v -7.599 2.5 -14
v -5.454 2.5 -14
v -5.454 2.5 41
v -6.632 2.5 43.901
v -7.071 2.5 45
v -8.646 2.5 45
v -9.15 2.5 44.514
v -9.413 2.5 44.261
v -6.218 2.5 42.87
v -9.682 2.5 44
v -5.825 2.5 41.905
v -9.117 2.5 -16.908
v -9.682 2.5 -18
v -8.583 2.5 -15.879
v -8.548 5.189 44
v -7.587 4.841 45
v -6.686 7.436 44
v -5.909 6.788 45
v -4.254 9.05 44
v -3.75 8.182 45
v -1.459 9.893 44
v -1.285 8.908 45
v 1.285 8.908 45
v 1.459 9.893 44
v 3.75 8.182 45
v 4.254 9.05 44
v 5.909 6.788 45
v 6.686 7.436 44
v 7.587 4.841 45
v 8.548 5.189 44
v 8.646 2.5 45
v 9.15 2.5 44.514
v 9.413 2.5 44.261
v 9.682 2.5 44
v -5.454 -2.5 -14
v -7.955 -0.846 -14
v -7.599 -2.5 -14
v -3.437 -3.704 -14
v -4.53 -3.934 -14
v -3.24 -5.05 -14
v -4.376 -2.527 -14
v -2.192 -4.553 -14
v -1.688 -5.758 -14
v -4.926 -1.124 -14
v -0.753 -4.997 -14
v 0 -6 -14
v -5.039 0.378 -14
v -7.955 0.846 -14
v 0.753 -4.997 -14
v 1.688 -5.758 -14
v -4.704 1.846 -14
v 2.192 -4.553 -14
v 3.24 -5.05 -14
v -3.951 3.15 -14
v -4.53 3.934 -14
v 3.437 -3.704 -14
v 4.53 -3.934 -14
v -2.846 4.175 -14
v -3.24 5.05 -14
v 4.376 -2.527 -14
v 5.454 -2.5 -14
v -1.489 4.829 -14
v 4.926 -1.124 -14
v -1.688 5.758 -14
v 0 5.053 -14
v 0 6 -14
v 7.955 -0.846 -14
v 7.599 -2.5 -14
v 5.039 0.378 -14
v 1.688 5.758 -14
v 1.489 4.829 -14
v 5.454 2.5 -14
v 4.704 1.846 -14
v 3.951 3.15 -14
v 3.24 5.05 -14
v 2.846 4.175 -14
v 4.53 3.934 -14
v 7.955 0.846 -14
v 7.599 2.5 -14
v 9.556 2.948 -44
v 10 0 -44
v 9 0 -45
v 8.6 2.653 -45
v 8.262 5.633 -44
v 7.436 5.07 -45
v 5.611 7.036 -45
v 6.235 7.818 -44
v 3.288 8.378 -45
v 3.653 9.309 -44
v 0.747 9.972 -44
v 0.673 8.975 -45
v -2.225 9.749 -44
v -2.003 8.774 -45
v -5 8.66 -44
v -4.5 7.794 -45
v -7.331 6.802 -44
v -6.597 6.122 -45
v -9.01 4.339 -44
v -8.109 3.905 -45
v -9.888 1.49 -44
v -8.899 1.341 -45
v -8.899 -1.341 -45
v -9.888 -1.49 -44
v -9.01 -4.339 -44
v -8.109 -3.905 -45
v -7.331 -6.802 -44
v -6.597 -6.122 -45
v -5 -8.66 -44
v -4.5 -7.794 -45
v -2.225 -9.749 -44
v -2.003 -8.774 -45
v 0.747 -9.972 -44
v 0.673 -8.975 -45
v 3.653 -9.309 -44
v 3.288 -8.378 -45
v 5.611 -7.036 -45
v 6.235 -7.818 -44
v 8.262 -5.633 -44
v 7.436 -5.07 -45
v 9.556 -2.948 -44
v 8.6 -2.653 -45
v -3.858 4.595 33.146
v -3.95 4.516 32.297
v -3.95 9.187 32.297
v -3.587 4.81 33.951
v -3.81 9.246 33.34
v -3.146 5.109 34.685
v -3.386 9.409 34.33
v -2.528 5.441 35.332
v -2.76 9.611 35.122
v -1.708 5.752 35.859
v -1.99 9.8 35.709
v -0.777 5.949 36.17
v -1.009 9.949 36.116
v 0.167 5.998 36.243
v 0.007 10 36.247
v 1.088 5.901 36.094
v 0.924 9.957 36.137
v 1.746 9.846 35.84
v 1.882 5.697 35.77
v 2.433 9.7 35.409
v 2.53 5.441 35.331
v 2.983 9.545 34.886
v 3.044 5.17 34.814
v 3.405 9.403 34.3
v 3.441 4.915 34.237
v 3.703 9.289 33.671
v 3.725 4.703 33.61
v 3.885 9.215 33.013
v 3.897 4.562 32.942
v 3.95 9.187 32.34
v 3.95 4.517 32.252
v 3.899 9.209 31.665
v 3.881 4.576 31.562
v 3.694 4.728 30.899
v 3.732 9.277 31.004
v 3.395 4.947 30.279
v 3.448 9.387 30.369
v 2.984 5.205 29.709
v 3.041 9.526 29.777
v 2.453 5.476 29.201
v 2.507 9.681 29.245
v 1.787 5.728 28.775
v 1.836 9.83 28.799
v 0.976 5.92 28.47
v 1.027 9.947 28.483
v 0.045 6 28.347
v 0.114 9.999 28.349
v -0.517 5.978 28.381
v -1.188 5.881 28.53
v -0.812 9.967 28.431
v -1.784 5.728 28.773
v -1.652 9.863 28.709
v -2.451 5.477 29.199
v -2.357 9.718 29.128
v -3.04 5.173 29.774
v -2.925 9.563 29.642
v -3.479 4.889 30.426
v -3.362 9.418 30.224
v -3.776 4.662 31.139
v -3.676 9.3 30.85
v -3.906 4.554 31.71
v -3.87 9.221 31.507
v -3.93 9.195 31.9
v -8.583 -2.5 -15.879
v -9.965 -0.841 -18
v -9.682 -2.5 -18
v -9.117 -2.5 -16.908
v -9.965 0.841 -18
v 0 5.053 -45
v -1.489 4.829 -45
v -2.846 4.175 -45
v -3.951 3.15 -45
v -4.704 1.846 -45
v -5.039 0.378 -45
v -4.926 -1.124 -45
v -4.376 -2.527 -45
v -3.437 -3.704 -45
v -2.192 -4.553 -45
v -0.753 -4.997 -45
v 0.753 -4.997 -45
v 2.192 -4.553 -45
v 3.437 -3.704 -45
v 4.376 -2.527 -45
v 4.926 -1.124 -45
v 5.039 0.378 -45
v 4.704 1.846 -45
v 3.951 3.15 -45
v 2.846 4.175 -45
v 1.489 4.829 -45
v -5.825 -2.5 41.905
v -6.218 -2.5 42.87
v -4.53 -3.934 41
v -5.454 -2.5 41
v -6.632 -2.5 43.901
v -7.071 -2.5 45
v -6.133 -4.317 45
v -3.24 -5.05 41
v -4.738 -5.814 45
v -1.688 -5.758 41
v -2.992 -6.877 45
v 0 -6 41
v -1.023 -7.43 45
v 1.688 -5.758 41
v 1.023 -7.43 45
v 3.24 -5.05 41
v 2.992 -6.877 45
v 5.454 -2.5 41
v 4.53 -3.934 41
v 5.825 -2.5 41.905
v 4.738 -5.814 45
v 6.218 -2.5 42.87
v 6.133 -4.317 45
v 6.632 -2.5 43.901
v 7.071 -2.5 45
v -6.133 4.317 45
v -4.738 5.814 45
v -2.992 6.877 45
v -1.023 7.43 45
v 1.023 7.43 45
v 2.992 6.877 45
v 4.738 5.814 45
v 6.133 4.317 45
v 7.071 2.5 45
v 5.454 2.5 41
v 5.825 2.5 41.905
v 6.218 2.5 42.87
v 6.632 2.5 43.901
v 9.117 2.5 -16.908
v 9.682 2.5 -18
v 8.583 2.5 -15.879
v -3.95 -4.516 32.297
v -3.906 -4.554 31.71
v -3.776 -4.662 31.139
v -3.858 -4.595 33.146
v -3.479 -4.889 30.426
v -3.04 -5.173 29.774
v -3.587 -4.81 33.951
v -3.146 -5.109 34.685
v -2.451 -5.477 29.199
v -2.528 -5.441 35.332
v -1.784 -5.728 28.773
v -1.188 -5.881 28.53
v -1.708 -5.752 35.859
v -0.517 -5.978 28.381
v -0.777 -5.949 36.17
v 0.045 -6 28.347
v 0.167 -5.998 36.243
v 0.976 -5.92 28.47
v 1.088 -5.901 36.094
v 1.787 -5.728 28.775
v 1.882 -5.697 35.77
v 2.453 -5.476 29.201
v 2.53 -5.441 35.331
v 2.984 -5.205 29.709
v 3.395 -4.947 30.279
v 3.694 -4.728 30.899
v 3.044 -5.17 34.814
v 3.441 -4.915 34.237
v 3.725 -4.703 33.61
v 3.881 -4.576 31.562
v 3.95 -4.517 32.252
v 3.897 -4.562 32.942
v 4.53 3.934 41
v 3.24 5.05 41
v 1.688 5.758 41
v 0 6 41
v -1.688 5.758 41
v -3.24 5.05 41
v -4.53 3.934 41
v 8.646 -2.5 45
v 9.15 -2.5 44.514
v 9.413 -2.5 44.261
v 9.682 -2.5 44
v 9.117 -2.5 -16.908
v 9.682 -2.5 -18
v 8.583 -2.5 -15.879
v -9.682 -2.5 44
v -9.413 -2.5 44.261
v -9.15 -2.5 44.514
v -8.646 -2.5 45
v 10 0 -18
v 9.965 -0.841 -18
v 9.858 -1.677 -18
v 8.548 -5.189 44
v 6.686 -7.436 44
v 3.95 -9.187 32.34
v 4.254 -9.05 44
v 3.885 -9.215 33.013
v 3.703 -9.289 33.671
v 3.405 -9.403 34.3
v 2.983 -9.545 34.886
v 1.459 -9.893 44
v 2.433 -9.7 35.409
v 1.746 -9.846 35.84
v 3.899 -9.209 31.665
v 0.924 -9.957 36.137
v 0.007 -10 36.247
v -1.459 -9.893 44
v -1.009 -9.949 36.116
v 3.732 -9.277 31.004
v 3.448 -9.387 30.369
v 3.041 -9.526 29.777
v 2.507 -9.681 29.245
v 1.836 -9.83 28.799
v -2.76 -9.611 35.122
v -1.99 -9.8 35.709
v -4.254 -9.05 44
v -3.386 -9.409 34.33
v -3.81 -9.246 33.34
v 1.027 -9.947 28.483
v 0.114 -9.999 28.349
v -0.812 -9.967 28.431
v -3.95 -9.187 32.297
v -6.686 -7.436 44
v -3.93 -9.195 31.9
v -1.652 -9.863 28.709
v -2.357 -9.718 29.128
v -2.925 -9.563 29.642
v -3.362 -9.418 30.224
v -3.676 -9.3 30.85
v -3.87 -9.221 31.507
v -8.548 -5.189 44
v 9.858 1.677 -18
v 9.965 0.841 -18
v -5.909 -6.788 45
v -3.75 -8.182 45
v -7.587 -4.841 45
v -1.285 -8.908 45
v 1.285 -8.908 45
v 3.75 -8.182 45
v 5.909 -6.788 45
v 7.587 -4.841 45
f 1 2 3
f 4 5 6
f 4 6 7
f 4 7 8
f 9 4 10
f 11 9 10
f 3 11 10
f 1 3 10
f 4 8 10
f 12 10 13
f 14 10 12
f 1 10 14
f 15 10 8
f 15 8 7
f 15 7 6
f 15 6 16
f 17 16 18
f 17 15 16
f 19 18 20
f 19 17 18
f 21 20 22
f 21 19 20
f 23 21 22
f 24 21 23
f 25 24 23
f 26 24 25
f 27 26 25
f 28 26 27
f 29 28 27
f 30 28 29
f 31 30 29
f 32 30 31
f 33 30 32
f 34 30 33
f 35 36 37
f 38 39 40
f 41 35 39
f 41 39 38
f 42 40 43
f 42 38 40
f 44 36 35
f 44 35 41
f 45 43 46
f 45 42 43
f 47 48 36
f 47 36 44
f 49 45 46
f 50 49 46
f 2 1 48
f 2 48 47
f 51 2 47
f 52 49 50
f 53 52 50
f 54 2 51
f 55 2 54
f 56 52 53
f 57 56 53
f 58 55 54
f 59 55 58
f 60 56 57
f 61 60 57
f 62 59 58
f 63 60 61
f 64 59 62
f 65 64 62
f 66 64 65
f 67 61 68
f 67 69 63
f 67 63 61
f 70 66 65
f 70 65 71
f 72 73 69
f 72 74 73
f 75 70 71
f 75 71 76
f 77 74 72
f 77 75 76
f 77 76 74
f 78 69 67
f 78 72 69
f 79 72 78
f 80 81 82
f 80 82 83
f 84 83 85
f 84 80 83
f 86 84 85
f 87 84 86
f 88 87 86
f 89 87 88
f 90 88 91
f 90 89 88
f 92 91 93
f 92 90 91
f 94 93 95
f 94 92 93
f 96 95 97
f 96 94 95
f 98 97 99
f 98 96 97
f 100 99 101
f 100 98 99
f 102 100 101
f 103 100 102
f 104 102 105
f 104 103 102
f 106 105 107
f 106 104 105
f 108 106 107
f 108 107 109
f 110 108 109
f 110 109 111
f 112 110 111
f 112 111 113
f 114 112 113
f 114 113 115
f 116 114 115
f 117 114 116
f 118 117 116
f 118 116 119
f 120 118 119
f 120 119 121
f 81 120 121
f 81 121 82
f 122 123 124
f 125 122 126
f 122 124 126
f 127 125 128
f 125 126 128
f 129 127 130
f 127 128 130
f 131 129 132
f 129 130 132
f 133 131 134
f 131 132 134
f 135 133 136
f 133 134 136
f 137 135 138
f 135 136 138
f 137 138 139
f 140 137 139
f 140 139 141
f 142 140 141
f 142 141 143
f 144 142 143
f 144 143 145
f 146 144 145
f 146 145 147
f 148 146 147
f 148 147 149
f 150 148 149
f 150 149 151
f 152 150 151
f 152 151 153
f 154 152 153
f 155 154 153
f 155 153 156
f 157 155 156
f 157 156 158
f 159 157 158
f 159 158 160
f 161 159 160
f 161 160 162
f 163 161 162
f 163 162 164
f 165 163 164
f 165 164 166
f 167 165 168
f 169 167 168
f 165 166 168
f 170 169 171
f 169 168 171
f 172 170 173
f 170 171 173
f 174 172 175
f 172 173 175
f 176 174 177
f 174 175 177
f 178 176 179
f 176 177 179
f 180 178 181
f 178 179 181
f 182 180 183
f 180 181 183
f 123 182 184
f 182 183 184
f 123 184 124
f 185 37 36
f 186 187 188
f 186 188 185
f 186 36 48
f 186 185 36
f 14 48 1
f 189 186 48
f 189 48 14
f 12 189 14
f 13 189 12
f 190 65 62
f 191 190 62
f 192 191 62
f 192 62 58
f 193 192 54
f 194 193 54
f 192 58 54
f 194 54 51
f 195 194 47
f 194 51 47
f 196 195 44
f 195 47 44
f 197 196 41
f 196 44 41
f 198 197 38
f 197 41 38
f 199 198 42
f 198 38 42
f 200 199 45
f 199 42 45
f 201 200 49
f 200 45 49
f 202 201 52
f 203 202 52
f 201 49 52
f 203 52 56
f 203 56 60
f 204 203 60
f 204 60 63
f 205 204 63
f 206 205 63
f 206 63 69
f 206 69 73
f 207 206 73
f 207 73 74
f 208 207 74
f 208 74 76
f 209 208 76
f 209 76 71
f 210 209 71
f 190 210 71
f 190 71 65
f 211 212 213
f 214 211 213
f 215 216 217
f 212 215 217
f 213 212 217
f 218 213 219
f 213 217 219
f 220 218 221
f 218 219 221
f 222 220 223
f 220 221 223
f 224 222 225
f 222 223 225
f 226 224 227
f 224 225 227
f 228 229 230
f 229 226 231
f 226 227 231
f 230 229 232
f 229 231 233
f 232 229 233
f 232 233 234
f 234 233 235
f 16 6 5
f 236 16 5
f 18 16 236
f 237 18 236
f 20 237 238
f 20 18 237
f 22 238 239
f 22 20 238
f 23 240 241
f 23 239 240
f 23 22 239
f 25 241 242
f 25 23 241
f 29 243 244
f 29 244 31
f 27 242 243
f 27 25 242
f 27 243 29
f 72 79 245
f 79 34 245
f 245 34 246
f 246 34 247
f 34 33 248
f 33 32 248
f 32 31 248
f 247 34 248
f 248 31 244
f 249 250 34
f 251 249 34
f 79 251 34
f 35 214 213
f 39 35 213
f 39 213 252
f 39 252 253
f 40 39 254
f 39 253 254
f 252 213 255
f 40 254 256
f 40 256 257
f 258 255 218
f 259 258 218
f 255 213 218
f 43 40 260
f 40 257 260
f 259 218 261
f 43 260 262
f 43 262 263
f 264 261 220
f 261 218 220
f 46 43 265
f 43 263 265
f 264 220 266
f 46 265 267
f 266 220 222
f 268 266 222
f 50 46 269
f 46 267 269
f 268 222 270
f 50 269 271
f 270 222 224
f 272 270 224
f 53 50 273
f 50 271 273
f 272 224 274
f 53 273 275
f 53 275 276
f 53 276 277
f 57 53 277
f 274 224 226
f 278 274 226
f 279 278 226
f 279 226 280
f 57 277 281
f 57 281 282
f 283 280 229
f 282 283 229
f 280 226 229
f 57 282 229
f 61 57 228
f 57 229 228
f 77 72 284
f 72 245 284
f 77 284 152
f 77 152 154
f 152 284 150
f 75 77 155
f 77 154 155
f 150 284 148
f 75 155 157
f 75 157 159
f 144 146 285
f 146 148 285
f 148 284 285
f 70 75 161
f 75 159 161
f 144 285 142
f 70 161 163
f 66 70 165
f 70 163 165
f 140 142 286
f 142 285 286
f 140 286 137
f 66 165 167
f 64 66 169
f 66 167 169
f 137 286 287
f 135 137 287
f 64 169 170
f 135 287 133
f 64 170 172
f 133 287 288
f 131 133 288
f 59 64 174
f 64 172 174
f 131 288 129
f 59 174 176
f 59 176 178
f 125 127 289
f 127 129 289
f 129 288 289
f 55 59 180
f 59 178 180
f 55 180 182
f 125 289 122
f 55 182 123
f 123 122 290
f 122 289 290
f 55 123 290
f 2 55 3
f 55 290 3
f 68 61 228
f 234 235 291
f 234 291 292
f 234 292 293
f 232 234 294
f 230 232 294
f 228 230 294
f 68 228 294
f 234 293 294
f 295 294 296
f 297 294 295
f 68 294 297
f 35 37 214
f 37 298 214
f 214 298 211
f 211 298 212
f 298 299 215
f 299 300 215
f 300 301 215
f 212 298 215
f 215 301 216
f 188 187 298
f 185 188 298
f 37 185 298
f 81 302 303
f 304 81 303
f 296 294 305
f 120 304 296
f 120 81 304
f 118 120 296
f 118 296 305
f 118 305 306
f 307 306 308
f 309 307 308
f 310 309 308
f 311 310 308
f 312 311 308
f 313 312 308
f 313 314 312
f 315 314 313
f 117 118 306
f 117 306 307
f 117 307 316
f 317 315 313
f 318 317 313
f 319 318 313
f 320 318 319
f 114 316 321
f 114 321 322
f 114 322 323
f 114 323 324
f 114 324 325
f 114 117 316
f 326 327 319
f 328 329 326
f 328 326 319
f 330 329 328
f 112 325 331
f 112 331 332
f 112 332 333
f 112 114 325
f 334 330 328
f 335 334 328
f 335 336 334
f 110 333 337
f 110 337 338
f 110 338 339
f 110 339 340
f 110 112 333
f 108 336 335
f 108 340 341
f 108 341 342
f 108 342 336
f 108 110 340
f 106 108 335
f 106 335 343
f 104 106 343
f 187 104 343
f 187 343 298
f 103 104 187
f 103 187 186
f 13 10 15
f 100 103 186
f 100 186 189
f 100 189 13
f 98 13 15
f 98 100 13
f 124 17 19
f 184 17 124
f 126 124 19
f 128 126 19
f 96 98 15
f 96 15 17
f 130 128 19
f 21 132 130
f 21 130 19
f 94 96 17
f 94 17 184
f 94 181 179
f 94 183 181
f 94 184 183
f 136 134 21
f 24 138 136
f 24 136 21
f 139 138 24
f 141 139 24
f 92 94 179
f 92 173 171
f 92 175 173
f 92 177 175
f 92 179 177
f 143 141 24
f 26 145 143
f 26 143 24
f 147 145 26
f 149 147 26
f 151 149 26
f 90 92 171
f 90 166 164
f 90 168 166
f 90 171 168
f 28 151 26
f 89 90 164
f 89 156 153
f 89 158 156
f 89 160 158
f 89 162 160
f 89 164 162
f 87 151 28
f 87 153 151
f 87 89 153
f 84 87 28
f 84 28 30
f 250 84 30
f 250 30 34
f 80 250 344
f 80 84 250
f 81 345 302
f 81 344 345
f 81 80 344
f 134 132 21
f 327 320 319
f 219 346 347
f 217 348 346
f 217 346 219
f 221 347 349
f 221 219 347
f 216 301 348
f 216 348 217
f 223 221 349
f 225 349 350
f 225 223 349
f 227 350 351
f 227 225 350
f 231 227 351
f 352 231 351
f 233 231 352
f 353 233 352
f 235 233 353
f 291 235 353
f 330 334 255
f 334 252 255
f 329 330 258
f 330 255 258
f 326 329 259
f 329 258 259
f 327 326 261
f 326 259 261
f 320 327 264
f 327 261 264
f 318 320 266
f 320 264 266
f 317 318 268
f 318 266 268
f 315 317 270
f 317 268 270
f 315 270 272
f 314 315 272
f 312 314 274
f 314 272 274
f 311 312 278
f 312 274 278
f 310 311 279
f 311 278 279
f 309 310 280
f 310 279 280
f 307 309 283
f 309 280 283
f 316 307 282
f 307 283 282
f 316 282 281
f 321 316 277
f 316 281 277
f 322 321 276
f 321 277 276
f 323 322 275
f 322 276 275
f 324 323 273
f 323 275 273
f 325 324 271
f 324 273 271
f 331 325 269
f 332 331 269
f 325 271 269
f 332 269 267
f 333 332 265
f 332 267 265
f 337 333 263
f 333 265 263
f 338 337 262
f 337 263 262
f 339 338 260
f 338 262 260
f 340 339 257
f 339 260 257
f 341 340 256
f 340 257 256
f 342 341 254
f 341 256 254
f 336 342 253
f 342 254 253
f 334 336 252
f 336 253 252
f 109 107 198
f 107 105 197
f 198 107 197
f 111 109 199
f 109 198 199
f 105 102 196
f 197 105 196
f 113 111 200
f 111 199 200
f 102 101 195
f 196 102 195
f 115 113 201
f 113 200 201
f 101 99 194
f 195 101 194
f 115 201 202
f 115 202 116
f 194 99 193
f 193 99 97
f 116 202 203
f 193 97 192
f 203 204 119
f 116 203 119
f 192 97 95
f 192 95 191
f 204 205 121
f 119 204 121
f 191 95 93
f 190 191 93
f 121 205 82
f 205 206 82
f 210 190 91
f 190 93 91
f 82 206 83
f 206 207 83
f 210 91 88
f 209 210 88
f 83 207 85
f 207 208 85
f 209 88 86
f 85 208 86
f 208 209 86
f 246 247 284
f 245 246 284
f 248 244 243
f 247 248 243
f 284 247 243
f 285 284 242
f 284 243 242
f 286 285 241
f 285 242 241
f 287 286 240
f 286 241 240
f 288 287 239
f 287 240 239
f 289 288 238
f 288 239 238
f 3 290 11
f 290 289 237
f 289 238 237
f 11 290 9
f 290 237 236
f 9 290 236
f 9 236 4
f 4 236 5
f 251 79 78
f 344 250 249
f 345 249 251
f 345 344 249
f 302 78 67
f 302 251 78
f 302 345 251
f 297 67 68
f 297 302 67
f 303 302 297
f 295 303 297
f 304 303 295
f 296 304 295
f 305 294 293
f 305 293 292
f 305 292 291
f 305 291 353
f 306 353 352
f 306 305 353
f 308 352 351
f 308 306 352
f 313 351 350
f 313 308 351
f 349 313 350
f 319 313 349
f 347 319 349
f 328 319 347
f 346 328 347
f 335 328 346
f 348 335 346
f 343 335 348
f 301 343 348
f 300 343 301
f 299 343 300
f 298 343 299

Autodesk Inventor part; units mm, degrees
ref_plane "YZ Plane" through (0, 0, 0) normal (1, 0, 0) x (0, 1, 0)
ref_plane "XY Plane" through (0, 0, 0) normal (0, 0, 1) x (1, 0, 0)
sketch "Sketch1" plane through (0, 0, 0) normal (0, 0, 1) x (1, 0, 0)
  circle A0 centre (0, 0) radius 10
  dimension "d0" = 20
extrude "Extrusion1" add sketch "Sketch1" along normal mid plane 90
sketch "Sketch2" plane through (0, 0, 45) normal (0, 0, 1) x (1, 0, 0)
  circle A0 centre (0, 0) radius 6
  line L0 (-10, -2.5) -> (10, -2.5)
  line L1 (10, -2.5) -> (10, 2.5)
  line L2 (10, 2.5) -> (-10, 2.5)
  line L3 (-10, 2.5) -> (-10, -2.5)
  point P0 (-10, 0)
  point P1 (10, 0)
  dimension "d3" = 12
  dimension "d4" = 5
  dimension "d5" = 2.5
  dimension "d6" = 20
  dimension "d7" = 10
extrude "Extrusion2" cut sketch "Sketch2" against normal blind 59
chamfer "Chamfer1" distance 1 angle 45 2 edges at (0, -10, 45) (0, 10, 45)
chamfer "Chamfer2" distance 1.5 distance2 4 1 edges at (0, 6, 45) measured on face at (-7.3096, 3.1466, 45)
chamfer "Chamfer3" distance 1.5 distance2 4 1 edges at (0, -6, 45) measured on face at (-7.3096, -3.1466, 45)
chamfer "Chamfer4" distance 4 distance2 2 1 edges at (-10, 0, -14) measured on face at (8.4358, 5.37, -15.3333)
chamfer "Chamfer5" distance 4 distance2 2 2 edges at (9.9203, 1.26, -14) (9.9203, -1.26, -14) measured on face at (8.4358, 5.37, -15.3333)
chamfer "Chamfer6" distance 1 angle 45 1 edges at (-10, 0, -45)
sketch "Sketch3" plane through (0, 0, -45) normal (0, 0, -1) x (-1, 0, 0)
  circle A0 centre (0, 0) radius 9 projected
hole "Hole1" at (0, 0, -45) direction (0, 0, 1) diameter 10.106 depth 45 thread size "M12x1.75" class "6H" standard "ANSI Metric M Profile"
sketch "Sketch4" plane through (0, 0, 0) normal (0, 1, 0) x (-1, 0, 0)
  line L0 (0, -9) -> (0, 54) projected
  circle A0 centre (0, 32.297) radius 3.95
  line L1 (-8.6458, 45) -> (8.6458, 45) projected
  point P0 (0, 0)
  dimension "d35" = 12.703
  dimension "d36" = 7.9
extrude "Extrusion3" cut sketch "Sketch4" along normal through all both and the other way through all
equation "\"d5\" = 0.5 * d4"
properties part number "201-02" material "Acetal Resin, Black"
